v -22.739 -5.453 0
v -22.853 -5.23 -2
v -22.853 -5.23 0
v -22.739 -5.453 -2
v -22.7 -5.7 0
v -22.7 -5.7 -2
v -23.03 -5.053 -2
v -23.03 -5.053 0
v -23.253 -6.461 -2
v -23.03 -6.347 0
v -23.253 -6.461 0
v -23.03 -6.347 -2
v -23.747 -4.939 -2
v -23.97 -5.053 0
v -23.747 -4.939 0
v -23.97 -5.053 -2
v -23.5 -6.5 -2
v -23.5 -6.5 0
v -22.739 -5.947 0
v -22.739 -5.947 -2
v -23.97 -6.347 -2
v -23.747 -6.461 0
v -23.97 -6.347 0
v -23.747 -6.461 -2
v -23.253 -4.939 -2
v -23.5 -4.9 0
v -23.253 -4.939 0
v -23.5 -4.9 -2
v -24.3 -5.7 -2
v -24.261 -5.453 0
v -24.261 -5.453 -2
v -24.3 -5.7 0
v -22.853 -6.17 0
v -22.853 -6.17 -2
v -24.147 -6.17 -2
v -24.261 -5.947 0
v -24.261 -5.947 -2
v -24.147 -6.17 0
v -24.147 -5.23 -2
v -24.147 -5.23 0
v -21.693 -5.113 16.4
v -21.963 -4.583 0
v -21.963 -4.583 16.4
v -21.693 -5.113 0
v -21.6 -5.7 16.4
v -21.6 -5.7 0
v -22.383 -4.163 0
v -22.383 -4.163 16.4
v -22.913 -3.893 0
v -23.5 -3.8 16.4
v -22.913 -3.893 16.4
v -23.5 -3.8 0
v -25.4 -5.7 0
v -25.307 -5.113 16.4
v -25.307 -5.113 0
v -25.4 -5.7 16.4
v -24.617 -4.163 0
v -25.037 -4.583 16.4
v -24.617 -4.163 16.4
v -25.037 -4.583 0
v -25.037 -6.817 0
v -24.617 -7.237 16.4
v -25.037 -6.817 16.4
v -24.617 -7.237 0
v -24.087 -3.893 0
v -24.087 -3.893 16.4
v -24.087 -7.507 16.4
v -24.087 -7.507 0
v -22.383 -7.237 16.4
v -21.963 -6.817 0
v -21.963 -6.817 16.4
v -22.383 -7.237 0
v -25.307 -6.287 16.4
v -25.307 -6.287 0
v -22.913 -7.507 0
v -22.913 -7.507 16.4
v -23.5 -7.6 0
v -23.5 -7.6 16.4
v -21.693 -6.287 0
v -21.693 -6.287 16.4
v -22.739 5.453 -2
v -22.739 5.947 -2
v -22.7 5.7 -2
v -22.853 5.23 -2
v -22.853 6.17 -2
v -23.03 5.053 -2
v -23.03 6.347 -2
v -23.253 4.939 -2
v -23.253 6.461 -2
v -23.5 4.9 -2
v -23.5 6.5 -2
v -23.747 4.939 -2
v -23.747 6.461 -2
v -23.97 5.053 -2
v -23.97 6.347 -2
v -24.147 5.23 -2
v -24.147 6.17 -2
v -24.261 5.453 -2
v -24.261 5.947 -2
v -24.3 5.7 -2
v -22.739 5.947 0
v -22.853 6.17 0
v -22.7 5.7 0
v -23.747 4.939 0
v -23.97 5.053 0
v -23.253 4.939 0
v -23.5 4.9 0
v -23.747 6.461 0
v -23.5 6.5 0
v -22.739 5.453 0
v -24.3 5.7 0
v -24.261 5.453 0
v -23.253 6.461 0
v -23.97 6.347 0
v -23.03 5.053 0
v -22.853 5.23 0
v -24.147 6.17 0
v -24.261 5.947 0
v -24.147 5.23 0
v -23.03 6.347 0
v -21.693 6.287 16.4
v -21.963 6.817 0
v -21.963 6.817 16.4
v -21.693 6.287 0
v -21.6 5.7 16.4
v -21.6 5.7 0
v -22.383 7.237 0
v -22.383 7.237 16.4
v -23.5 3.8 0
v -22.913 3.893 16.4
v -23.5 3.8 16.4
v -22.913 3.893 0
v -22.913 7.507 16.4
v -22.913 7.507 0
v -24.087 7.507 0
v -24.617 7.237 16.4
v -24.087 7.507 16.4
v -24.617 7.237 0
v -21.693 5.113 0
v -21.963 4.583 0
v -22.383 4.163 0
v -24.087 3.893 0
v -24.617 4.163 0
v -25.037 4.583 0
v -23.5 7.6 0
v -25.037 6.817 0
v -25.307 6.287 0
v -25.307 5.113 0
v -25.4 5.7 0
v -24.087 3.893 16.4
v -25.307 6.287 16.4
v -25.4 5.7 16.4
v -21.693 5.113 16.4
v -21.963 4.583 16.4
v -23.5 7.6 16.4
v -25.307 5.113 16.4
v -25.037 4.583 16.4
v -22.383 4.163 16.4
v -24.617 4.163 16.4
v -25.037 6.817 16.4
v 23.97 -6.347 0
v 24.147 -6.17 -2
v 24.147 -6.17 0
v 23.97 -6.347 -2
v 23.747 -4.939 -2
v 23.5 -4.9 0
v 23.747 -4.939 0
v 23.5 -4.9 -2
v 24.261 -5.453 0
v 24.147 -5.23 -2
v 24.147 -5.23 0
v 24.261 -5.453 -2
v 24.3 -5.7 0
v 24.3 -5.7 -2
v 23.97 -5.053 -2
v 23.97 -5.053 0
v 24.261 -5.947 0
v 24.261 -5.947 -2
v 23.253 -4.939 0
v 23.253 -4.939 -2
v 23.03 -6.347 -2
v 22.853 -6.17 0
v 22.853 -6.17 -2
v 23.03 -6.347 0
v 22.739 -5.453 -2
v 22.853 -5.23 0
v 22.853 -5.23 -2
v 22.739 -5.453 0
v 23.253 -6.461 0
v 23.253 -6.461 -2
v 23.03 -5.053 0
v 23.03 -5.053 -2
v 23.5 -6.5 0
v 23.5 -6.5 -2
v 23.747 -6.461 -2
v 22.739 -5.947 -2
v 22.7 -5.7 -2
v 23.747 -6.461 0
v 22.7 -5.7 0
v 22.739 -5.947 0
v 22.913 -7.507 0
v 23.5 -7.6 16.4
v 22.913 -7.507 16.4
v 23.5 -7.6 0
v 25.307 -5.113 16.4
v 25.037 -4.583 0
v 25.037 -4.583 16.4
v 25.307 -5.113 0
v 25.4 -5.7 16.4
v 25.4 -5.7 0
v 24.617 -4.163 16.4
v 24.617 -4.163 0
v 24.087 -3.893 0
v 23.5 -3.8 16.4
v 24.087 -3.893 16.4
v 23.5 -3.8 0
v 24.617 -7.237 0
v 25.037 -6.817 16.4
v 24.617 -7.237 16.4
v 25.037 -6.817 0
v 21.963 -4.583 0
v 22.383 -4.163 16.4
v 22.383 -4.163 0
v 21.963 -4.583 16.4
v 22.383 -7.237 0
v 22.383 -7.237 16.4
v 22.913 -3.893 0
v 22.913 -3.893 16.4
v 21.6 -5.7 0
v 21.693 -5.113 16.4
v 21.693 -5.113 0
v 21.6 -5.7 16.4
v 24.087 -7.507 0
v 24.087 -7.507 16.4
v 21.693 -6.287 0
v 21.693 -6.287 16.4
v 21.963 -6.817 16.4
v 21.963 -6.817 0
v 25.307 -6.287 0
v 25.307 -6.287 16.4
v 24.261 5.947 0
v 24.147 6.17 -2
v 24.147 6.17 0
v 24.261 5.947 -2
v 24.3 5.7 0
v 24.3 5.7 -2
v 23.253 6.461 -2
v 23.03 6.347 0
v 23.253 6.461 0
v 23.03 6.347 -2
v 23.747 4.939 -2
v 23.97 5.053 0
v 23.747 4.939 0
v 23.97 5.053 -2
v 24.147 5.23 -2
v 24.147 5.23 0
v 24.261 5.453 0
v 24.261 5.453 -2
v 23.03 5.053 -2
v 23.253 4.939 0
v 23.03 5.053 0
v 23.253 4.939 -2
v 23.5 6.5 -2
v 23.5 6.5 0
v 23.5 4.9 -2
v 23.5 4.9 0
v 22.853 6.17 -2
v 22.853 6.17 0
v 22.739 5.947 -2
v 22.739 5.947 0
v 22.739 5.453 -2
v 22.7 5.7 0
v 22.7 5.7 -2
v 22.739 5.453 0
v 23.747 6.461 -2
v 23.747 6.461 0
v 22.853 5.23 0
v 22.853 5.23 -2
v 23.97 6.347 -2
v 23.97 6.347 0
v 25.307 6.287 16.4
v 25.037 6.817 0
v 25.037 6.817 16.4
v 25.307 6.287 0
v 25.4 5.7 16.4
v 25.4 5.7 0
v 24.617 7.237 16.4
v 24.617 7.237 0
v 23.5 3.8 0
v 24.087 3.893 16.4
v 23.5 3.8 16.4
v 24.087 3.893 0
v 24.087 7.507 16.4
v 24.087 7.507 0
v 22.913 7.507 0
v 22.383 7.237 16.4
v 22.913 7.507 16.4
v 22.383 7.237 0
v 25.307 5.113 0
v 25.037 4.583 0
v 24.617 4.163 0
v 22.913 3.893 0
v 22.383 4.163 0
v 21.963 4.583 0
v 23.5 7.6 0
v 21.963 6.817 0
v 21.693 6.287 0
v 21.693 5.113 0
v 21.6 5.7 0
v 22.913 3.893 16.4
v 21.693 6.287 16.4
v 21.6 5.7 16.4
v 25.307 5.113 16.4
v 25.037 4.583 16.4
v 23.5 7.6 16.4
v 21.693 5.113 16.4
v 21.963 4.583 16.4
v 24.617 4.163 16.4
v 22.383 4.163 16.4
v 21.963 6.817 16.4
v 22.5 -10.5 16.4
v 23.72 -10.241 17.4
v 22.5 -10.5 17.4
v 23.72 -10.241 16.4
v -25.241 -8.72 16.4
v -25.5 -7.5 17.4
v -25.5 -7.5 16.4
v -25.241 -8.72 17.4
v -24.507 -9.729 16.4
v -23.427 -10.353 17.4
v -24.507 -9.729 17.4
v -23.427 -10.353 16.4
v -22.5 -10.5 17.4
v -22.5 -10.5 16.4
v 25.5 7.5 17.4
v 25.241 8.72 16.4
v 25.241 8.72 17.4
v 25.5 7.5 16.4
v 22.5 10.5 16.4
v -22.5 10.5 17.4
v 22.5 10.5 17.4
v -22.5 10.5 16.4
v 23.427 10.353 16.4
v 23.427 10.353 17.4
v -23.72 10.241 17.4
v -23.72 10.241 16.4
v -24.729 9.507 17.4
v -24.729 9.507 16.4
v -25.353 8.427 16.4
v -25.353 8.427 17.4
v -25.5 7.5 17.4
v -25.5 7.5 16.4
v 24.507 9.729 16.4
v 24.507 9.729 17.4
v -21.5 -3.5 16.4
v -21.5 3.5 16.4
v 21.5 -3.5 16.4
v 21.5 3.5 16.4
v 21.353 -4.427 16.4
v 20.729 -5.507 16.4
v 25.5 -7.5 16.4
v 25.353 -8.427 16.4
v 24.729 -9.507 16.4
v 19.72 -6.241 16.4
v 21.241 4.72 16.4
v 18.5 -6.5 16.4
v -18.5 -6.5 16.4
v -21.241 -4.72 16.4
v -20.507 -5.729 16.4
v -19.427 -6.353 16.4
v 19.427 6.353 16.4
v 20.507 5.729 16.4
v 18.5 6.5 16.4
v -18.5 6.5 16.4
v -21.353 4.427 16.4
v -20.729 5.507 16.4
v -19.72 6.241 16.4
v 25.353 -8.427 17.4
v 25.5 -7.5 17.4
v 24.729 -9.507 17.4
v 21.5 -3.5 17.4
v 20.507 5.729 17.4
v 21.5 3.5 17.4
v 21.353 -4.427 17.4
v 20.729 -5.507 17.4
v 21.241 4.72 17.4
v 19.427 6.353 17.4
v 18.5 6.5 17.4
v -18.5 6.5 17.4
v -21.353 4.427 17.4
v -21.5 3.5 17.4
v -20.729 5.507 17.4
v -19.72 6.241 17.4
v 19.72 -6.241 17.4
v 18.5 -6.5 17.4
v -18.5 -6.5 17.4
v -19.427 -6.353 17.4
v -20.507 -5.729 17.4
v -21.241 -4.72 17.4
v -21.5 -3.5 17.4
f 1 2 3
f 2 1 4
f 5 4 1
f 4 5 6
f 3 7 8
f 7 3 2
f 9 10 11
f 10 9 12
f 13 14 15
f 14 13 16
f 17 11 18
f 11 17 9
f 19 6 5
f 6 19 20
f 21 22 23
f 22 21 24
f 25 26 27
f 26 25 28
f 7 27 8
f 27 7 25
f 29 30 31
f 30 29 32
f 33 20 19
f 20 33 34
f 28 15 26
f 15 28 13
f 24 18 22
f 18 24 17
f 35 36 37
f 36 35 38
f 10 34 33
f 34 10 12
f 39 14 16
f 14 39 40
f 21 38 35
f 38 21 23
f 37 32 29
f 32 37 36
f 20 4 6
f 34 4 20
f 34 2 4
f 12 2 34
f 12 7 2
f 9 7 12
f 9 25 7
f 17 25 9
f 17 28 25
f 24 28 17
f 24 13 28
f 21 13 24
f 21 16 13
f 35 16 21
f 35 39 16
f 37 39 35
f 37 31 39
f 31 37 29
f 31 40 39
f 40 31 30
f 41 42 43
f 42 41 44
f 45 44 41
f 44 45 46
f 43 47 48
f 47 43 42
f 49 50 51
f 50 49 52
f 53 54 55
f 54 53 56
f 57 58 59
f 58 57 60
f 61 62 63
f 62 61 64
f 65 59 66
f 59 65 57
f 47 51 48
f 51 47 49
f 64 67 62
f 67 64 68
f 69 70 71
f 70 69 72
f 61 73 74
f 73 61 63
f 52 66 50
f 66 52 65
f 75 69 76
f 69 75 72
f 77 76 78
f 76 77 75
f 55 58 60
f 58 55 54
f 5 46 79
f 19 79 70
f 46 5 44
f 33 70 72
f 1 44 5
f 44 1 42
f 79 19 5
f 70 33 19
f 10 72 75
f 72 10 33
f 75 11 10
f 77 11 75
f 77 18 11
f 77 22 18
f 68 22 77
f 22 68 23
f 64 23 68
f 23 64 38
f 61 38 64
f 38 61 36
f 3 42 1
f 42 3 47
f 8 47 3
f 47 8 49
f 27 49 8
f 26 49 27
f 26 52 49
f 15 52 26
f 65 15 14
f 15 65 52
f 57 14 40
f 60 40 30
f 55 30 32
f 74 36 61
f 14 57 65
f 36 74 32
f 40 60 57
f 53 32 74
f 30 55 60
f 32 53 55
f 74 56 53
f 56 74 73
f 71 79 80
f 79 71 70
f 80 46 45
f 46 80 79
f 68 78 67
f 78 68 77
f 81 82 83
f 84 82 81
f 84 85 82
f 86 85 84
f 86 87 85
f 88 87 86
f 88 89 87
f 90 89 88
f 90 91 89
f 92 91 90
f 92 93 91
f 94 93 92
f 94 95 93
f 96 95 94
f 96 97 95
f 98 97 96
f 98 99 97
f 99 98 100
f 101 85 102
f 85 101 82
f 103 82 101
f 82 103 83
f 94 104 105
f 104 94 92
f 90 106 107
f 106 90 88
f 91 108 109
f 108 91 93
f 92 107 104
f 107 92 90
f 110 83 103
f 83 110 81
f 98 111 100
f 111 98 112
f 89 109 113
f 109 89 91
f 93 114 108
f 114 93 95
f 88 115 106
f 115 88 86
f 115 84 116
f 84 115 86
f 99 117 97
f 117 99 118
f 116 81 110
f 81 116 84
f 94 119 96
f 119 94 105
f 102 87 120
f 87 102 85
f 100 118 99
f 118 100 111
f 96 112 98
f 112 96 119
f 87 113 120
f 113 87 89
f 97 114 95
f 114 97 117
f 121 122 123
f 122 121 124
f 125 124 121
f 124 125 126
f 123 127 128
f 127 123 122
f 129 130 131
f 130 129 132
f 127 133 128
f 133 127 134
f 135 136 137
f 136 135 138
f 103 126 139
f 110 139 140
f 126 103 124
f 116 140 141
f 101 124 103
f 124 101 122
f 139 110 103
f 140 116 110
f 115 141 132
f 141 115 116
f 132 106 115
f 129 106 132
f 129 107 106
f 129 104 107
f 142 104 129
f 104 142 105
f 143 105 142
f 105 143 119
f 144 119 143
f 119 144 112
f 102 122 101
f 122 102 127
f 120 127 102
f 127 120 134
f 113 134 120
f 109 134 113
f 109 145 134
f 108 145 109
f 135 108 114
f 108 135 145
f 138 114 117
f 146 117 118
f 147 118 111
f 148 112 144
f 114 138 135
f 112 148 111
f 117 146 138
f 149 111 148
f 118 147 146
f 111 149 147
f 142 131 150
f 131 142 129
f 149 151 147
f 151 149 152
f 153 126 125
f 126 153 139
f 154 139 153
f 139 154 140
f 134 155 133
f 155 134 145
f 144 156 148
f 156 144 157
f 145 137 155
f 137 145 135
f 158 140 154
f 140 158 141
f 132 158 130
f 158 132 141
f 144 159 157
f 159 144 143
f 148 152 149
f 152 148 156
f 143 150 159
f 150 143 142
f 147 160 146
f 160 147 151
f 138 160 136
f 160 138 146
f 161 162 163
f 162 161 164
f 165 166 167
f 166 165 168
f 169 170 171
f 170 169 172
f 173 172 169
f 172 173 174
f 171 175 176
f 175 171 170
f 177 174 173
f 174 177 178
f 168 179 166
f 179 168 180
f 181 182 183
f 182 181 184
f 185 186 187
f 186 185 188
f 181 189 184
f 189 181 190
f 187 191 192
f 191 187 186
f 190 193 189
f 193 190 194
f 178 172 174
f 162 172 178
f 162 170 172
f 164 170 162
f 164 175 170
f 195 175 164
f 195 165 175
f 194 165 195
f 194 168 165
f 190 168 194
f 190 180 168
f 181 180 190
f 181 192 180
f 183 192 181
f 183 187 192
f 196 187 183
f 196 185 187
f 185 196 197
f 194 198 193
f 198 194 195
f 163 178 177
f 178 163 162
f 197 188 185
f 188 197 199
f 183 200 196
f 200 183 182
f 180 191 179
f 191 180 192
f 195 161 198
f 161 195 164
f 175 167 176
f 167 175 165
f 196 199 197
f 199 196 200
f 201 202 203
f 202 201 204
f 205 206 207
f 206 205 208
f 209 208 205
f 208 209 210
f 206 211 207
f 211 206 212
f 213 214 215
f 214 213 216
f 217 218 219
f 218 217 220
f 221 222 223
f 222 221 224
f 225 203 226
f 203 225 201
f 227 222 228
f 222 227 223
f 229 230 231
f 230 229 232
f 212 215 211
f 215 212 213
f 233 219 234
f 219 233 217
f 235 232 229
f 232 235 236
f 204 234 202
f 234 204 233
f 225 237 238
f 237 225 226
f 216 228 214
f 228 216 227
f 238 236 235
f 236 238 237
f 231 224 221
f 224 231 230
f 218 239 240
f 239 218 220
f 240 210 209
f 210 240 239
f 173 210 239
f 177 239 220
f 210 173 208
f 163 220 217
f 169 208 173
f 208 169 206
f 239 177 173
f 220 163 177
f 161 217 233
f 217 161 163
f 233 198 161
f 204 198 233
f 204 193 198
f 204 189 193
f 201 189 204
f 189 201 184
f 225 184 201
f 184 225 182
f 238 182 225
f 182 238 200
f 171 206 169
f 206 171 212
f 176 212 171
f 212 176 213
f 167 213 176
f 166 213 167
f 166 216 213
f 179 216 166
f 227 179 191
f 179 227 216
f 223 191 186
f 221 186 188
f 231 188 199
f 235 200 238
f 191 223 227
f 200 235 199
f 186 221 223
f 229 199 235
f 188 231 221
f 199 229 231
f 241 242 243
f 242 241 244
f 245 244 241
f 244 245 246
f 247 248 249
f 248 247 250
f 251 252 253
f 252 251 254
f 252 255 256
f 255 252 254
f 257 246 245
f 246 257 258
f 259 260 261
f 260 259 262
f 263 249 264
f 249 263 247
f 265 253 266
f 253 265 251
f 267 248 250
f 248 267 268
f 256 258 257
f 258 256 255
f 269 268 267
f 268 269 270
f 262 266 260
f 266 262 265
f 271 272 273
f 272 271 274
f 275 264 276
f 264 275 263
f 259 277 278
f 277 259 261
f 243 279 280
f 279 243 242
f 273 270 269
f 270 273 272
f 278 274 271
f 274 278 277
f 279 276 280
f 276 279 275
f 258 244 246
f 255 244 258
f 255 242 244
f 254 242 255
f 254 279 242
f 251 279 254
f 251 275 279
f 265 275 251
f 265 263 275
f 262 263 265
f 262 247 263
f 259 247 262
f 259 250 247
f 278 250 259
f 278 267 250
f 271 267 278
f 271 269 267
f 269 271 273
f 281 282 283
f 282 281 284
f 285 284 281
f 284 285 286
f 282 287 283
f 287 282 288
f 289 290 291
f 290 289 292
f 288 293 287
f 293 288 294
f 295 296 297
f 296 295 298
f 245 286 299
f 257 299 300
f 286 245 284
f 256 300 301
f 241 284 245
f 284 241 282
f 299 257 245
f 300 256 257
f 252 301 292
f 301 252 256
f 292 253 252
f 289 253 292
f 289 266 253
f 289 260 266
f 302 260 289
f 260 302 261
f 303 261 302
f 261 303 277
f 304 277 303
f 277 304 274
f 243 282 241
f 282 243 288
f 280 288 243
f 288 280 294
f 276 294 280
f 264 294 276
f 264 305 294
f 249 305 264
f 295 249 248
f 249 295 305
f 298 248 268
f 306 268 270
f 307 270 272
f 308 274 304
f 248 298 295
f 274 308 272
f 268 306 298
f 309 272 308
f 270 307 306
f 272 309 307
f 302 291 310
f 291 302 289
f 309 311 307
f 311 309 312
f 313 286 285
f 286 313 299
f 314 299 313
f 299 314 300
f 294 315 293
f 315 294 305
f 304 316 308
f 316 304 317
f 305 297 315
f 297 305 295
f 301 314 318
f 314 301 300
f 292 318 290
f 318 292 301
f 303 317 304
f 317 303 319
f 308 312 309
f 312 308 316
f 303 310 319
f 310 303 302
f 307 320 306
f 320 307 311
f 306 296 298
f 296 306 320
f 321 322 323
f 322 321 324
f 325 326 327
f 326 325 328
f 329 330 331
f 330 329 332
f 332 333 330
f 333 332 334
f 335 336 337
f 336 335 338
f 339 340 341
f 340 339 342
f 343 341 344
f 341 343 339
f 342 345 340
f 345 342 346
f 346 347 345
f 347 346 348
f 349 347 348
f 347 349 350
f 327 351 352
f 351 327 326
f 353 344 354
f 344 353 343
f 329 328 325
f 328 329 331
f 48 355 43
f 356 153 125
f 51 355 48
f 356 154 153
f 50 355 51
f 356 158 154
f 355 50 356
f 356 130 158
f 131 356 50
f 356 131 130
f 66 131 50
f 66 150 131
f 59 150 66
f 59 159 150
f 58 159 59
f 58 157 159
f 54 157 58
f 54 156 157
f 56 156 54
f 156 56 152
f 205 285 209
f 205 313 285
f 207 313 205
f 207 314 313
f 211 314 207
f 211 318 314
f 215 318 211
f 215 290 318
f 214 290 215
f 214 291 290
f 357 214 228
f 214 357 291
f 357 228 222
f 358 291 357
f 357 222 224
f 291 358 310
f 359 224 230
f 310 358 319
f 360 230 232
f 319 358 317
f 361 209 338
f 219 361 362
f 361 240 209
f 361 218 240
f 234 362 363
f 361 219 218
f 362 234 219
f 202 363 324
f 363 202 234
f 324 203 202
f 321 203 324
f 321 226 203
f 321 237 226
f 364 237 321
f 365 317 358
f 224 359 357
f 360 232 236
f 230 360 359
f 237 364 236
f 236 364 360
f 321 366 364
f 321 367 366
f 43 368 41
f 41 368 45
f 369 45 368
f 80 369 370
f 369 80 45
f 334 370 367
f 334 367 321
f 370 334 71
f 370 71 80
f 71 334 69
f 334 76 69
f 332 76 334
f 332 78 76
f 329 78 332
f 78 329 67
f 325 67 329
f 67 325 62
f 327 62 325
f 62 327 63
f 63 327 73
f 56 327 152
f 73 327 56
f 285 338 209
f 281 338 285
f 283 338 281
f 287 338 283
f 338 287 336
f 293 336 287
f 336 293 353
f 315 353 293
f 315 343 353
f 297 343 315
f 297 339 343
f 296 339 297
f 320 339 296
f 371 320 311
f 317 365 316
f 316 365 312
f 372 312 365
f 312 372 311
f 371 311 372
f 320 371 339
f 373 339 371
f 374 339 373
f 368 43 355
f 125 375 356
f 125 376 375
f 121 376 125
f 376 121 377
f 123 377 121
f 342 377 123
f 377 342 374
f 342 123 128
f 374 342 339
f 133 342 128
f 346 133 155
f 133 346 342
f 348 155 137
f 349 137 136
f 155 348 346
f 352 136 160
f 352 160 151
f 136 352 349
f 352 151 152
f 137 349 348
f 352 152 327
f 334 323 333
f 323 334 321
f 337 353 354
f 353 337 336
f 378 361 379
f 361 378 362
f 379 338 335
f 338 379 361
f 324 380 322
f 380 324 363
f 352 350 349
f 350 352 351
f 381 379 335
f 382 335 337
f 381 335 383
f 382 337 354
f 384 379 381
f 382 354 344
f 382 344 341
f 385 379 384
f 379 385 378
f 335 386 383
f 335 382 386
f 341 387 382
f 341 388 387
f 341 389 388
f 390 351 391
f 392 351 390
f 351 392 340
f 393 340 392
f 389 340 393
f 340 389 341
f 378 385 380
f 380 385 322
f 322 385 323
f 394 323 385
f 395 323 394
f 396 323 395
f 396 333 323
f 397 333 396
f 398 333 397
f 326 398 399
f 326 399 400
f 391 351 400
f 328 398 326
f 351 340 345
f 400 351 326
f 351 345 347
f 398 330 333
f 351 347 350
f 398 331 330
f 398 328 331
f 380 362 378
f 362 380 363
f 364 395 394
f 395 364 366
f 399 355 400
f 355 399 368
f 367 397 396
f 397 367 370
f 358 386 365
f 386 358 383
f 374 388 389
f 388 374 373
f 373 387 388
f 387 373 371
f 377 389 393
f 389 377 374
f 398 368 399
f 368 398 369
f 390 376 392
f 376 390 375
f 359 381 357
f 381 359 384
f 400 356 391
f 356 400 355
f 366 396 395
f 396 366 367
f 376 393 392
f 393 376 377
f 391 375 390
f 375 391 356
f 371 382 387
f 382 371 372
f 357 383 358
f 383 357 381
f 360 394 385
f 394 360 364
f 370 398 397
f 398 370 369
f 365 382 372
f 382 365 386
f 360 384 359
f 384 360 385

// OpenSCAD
// file: pico.scad
module pico() { translate([ 0, 0, 1 ]) rotate(a = [ 90, 0, 90 ]) import("RaspberryPiPico.amf", convexity = 3); }

module pico_test() { pico(); }

//pico_test();
// main file
include <pico.scad>


plate_to_support = 8.4 + 9;
pico_length = 51;
pico_width = 21;
mhole_spacew = 11.4;
mhole_spacel = pico_length - 2*2.0;
holedia = 2.1;
sup_dia = 3.8;
fuz =0.01;

if($preview) translate([0,0,-1.5]) pico();

difference() {
    union() {
        translate([0,0,plate_to_support-1]) linear_extrude(1) offset(3, $fn=15) 
            square([pico_length-3*2,pico_width-3*2], center=true);
        for(i = [-1:2:1]) {
            for ( j=[-1:2:1]) {
                union() {
                translate([mhole_spacel/2*i, mhole_spacew/2*j, -2]) 
                    cylinder(h=10, r=holedia/2-0.25, $fn=20, center=false);
                translate([mhole_spacel/2*i, mhole_spacew/2*j, 0]) 
                    cylinder(h=plate_to_support-fuz, r=sup_dia/2, $fn=20, center=false);
                }
            }
        }
    }
    translate([0,0,plate_to_support-1.5]) linear_extrude(3) offset(3, $fn=15) 
            square([pico_length-3*2-8,pico_width-3*2-8], center=true);
}
